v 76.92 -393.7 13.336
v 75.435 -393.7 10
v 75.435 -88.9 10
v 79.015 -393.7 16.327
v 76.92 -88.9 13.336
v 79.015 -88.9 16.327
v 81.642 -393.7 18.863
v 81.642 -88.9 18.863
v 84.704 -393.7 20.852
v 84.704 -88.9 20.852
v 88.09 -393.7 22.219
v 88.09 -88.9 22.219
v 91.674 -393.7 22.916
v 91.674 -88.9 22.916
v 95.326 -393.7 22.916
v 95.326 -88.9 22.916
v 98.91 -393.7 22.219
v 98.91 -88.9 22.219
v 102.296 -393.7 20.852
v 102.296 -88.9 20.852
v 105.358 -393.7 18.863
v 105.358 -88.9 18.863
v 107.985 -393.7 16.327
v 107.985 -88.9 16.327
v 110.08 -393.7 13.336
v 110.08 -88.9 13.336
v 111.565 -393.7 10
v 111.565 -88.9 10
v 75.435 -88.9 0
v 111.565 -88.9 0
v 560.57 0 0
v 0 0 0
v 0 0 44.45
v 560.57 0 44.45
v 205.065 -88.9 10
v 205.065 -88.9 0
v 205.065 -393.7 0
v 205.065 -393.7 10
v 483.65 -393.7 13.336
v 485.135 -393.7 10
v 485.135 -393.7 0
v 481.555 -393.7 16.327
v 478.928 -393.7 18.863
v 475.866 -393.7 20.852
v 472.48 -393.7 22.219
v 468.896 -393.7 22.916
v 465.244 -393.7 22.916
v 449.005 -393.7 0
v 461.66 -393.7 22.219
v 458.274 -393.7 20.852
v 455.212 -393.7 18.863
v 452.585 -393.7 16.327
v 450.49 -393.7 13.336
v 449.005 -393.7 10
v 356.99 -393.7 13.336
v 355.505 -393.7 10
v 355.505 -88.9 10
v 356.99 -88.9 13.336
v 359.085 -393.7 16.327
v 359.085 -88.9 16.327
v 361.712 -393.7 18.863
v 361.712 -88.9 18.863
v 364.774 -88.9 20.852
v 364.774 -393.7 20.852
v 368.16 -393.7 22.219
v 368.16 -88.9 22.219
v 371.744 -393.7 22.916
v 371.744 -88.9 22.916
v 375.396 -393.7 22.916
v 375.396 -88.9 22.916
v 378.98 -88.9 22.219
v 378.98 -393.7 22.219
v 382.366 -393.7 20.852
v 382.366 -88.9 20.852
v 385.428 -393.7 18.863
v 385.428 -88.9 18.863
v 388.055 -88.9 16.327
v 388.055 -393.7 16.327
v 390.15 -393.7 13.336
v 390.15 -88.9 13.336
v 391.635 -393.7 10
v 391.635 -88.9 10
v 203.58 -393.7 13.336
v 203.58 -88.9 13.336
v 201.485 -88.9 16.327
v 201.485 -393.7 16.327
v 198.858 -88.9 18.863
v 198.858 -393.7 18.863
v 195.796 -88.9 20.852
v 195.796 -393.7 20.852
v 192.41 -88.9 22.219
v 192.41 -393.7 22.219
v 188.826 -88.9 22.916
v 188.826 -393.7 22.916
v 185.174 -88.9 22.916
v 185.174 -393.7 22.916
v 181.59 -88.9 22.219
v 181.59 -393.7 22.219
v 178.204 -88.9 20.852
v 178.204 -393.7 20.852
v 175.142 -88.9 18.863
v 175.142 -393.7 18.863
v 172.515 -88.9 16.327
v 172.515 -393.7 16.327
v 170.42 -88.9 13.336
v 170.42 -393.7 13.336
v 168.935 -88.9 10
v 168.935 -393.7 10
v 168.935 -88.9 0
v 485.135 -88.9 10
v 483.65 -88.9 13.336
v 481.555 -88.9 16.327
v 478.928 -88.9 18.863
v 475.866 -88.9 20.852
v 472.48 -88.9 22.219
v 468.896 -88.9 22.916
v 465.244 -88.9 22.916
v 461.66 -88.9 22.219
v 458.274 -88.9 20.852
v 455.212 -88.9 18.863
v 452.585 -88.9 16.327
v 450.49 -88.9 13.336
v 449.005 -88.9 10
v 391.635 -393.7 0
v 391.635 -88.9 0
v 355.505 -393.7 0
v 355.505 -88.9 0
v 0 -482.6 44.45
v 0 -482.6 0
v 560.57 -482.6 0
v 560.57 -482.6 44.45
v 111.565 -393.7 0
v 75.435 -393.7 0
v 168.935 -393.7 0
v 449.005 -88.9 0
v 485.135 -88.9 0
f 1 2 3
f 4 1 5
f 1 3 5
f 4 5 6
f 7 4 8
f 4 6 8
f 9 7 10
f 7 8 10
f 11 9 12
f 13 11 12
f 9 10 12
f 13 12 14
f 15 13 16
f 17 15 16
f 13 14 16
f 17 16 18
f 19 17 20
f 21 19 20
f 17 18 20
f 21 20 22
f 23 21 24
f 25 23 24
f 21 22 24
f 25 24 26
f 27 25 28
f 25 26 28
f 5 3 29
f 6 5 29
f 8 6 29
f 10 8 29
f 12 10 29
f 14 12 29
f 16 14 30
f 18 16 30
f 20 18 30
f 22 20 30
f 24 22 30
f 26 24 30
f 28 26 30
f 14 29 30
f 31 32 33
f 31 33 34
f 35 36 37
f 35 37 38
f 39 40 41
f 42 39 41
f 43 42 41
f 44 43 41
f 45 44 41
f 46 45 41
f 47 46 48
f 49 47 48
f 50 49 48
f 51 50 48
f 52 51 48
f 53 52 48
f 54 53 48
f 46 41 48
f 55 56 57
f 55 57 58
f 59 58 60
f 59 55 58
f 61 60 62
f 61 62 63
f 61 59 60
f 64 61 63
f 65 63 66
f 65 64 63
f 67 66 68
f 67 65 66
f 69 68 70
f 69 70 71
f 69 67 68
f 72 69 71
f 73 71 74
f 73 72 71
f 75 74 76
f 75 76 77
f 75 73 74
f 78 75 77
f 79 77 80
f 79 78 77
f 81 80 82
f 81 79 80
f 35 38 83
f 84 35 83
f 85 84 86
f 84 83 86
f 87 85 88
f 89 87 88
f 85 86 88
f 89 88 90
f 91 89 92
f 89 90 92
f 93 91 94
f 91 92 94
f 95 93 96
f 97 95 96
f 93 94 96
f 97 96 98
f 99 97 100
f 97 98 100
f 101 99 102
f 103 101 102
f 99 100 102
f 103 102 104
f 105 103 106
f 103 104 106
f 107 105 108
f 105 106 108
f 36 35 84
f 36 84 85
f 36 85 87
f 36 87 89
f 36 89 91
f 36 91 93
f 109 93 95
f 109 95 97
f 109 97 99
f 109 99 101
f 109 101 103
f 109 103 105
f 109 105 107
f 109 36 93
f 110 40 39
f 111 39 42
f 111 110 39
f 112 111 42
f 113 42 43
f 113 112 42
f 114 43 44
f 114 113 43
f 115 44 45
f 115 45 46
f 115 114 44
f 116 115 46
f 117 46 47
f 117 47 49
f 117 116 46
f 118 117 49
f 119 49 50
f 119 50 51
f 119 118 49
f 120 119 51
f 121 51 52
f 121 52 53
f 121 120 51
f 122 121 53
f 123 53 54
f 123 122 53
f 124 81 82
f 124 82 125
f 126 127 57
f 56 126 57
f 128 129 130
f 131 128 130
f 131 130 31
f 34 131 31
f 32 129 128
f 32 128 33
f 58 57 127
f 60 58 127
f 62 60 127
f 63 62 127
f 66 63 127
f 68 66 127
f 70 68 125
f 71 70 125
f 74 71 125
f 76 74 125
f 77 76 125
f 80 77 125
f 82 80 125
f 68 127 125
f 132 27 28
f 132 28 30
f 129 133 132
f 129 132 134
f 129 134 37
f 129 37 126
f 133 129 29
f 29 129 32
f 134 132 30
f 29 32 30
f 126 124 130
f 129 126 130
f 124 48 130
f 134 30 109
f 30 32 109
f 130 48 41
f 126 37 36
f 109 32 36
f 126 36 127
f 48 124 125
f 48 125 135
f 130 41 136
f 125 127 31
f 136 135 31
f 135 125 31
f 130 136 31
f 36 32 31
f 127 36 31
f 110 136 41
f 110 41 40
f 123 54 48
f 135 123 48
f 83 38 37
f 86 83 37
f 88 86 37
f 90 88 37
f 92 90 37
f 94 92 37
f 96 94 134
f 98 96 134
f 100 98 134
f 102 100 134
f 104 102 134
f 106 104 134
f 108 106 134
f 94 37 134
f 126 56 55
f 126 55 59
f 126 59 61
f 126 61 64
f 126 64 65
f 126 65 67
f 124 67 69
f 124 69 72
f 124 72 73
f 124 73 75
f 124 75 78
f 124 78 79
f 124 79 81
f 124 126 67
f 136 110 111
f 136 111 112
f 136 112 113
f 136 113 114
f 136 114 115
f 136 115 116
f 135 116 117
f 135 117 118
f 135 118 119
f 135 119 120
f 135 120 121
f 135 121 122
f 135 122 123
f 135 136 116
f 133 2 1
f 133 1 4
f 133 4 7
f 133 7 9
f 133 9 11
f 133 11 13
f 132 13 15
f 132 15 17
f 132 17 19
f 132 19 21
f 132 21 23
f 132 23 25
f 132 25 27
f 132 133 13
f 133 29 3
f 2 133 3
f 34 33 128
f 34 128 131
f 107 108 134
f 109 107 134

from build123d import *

# Parameters (mm, degrees)
SKETCH1_W           = 560.57
SKETCH1_H           = 482.6
BOSS_EXTRUDE1_DEPTH = 44.45
CUT_EXTRUDE1_DEPTH  = 152.4


with BuildPart() as part:
    # Sketch1 → Boss-Extrude1 (new body)
    with BuildSketch(Plane.XY):
        with Locations((280.285, -241.3)):
            Rectangle(SKETCH1_W, SKETCH1_H)
    extrude(amount=BOSS_EXTRUDE1_DEPTH)

    # Sketch2 → Cut-Extrude1 (cut, symmetric)
    with BuildSketch(Plane(origin=(0, -241.3, 0), x_dir=(-1, 0, 0), z_dir=(0, -1, 0))):
        with BuildLine():
            Line((-485.135, 0), (-485.135, -10))
            ThreePointArc((-485.135, -10), (-467.07, -23.003655986), (-449.005, -10))
            Line((-449.005, -10), (-449.005, 0))
            Line((-449.005, 0), (-485.135, 0))
        make_face()
        with BuildLine():
            Line((-391.635, -10), (-391.635, 0))
            Line((-391.635, 0), (-355.505, 0))
            Line((-355.505, 0), (-355.505, -10))
            ThreePointArc((-355.505, -10), (-373.57, -23.003655986), (-391.635, -10))
        make_face()
    cut_extrude1 = extrude(amount=CUT_EXTRUDE1_DEPTH, both=True, mode=Mode.SUBTRACT)

    # Mirror1: Cut-Extrude1 across plane
    add(cut_extrude1.mirror(Plane.ZY.offset(-280.285)), mode=Mode.SUBTRACT)


solid = part.part
